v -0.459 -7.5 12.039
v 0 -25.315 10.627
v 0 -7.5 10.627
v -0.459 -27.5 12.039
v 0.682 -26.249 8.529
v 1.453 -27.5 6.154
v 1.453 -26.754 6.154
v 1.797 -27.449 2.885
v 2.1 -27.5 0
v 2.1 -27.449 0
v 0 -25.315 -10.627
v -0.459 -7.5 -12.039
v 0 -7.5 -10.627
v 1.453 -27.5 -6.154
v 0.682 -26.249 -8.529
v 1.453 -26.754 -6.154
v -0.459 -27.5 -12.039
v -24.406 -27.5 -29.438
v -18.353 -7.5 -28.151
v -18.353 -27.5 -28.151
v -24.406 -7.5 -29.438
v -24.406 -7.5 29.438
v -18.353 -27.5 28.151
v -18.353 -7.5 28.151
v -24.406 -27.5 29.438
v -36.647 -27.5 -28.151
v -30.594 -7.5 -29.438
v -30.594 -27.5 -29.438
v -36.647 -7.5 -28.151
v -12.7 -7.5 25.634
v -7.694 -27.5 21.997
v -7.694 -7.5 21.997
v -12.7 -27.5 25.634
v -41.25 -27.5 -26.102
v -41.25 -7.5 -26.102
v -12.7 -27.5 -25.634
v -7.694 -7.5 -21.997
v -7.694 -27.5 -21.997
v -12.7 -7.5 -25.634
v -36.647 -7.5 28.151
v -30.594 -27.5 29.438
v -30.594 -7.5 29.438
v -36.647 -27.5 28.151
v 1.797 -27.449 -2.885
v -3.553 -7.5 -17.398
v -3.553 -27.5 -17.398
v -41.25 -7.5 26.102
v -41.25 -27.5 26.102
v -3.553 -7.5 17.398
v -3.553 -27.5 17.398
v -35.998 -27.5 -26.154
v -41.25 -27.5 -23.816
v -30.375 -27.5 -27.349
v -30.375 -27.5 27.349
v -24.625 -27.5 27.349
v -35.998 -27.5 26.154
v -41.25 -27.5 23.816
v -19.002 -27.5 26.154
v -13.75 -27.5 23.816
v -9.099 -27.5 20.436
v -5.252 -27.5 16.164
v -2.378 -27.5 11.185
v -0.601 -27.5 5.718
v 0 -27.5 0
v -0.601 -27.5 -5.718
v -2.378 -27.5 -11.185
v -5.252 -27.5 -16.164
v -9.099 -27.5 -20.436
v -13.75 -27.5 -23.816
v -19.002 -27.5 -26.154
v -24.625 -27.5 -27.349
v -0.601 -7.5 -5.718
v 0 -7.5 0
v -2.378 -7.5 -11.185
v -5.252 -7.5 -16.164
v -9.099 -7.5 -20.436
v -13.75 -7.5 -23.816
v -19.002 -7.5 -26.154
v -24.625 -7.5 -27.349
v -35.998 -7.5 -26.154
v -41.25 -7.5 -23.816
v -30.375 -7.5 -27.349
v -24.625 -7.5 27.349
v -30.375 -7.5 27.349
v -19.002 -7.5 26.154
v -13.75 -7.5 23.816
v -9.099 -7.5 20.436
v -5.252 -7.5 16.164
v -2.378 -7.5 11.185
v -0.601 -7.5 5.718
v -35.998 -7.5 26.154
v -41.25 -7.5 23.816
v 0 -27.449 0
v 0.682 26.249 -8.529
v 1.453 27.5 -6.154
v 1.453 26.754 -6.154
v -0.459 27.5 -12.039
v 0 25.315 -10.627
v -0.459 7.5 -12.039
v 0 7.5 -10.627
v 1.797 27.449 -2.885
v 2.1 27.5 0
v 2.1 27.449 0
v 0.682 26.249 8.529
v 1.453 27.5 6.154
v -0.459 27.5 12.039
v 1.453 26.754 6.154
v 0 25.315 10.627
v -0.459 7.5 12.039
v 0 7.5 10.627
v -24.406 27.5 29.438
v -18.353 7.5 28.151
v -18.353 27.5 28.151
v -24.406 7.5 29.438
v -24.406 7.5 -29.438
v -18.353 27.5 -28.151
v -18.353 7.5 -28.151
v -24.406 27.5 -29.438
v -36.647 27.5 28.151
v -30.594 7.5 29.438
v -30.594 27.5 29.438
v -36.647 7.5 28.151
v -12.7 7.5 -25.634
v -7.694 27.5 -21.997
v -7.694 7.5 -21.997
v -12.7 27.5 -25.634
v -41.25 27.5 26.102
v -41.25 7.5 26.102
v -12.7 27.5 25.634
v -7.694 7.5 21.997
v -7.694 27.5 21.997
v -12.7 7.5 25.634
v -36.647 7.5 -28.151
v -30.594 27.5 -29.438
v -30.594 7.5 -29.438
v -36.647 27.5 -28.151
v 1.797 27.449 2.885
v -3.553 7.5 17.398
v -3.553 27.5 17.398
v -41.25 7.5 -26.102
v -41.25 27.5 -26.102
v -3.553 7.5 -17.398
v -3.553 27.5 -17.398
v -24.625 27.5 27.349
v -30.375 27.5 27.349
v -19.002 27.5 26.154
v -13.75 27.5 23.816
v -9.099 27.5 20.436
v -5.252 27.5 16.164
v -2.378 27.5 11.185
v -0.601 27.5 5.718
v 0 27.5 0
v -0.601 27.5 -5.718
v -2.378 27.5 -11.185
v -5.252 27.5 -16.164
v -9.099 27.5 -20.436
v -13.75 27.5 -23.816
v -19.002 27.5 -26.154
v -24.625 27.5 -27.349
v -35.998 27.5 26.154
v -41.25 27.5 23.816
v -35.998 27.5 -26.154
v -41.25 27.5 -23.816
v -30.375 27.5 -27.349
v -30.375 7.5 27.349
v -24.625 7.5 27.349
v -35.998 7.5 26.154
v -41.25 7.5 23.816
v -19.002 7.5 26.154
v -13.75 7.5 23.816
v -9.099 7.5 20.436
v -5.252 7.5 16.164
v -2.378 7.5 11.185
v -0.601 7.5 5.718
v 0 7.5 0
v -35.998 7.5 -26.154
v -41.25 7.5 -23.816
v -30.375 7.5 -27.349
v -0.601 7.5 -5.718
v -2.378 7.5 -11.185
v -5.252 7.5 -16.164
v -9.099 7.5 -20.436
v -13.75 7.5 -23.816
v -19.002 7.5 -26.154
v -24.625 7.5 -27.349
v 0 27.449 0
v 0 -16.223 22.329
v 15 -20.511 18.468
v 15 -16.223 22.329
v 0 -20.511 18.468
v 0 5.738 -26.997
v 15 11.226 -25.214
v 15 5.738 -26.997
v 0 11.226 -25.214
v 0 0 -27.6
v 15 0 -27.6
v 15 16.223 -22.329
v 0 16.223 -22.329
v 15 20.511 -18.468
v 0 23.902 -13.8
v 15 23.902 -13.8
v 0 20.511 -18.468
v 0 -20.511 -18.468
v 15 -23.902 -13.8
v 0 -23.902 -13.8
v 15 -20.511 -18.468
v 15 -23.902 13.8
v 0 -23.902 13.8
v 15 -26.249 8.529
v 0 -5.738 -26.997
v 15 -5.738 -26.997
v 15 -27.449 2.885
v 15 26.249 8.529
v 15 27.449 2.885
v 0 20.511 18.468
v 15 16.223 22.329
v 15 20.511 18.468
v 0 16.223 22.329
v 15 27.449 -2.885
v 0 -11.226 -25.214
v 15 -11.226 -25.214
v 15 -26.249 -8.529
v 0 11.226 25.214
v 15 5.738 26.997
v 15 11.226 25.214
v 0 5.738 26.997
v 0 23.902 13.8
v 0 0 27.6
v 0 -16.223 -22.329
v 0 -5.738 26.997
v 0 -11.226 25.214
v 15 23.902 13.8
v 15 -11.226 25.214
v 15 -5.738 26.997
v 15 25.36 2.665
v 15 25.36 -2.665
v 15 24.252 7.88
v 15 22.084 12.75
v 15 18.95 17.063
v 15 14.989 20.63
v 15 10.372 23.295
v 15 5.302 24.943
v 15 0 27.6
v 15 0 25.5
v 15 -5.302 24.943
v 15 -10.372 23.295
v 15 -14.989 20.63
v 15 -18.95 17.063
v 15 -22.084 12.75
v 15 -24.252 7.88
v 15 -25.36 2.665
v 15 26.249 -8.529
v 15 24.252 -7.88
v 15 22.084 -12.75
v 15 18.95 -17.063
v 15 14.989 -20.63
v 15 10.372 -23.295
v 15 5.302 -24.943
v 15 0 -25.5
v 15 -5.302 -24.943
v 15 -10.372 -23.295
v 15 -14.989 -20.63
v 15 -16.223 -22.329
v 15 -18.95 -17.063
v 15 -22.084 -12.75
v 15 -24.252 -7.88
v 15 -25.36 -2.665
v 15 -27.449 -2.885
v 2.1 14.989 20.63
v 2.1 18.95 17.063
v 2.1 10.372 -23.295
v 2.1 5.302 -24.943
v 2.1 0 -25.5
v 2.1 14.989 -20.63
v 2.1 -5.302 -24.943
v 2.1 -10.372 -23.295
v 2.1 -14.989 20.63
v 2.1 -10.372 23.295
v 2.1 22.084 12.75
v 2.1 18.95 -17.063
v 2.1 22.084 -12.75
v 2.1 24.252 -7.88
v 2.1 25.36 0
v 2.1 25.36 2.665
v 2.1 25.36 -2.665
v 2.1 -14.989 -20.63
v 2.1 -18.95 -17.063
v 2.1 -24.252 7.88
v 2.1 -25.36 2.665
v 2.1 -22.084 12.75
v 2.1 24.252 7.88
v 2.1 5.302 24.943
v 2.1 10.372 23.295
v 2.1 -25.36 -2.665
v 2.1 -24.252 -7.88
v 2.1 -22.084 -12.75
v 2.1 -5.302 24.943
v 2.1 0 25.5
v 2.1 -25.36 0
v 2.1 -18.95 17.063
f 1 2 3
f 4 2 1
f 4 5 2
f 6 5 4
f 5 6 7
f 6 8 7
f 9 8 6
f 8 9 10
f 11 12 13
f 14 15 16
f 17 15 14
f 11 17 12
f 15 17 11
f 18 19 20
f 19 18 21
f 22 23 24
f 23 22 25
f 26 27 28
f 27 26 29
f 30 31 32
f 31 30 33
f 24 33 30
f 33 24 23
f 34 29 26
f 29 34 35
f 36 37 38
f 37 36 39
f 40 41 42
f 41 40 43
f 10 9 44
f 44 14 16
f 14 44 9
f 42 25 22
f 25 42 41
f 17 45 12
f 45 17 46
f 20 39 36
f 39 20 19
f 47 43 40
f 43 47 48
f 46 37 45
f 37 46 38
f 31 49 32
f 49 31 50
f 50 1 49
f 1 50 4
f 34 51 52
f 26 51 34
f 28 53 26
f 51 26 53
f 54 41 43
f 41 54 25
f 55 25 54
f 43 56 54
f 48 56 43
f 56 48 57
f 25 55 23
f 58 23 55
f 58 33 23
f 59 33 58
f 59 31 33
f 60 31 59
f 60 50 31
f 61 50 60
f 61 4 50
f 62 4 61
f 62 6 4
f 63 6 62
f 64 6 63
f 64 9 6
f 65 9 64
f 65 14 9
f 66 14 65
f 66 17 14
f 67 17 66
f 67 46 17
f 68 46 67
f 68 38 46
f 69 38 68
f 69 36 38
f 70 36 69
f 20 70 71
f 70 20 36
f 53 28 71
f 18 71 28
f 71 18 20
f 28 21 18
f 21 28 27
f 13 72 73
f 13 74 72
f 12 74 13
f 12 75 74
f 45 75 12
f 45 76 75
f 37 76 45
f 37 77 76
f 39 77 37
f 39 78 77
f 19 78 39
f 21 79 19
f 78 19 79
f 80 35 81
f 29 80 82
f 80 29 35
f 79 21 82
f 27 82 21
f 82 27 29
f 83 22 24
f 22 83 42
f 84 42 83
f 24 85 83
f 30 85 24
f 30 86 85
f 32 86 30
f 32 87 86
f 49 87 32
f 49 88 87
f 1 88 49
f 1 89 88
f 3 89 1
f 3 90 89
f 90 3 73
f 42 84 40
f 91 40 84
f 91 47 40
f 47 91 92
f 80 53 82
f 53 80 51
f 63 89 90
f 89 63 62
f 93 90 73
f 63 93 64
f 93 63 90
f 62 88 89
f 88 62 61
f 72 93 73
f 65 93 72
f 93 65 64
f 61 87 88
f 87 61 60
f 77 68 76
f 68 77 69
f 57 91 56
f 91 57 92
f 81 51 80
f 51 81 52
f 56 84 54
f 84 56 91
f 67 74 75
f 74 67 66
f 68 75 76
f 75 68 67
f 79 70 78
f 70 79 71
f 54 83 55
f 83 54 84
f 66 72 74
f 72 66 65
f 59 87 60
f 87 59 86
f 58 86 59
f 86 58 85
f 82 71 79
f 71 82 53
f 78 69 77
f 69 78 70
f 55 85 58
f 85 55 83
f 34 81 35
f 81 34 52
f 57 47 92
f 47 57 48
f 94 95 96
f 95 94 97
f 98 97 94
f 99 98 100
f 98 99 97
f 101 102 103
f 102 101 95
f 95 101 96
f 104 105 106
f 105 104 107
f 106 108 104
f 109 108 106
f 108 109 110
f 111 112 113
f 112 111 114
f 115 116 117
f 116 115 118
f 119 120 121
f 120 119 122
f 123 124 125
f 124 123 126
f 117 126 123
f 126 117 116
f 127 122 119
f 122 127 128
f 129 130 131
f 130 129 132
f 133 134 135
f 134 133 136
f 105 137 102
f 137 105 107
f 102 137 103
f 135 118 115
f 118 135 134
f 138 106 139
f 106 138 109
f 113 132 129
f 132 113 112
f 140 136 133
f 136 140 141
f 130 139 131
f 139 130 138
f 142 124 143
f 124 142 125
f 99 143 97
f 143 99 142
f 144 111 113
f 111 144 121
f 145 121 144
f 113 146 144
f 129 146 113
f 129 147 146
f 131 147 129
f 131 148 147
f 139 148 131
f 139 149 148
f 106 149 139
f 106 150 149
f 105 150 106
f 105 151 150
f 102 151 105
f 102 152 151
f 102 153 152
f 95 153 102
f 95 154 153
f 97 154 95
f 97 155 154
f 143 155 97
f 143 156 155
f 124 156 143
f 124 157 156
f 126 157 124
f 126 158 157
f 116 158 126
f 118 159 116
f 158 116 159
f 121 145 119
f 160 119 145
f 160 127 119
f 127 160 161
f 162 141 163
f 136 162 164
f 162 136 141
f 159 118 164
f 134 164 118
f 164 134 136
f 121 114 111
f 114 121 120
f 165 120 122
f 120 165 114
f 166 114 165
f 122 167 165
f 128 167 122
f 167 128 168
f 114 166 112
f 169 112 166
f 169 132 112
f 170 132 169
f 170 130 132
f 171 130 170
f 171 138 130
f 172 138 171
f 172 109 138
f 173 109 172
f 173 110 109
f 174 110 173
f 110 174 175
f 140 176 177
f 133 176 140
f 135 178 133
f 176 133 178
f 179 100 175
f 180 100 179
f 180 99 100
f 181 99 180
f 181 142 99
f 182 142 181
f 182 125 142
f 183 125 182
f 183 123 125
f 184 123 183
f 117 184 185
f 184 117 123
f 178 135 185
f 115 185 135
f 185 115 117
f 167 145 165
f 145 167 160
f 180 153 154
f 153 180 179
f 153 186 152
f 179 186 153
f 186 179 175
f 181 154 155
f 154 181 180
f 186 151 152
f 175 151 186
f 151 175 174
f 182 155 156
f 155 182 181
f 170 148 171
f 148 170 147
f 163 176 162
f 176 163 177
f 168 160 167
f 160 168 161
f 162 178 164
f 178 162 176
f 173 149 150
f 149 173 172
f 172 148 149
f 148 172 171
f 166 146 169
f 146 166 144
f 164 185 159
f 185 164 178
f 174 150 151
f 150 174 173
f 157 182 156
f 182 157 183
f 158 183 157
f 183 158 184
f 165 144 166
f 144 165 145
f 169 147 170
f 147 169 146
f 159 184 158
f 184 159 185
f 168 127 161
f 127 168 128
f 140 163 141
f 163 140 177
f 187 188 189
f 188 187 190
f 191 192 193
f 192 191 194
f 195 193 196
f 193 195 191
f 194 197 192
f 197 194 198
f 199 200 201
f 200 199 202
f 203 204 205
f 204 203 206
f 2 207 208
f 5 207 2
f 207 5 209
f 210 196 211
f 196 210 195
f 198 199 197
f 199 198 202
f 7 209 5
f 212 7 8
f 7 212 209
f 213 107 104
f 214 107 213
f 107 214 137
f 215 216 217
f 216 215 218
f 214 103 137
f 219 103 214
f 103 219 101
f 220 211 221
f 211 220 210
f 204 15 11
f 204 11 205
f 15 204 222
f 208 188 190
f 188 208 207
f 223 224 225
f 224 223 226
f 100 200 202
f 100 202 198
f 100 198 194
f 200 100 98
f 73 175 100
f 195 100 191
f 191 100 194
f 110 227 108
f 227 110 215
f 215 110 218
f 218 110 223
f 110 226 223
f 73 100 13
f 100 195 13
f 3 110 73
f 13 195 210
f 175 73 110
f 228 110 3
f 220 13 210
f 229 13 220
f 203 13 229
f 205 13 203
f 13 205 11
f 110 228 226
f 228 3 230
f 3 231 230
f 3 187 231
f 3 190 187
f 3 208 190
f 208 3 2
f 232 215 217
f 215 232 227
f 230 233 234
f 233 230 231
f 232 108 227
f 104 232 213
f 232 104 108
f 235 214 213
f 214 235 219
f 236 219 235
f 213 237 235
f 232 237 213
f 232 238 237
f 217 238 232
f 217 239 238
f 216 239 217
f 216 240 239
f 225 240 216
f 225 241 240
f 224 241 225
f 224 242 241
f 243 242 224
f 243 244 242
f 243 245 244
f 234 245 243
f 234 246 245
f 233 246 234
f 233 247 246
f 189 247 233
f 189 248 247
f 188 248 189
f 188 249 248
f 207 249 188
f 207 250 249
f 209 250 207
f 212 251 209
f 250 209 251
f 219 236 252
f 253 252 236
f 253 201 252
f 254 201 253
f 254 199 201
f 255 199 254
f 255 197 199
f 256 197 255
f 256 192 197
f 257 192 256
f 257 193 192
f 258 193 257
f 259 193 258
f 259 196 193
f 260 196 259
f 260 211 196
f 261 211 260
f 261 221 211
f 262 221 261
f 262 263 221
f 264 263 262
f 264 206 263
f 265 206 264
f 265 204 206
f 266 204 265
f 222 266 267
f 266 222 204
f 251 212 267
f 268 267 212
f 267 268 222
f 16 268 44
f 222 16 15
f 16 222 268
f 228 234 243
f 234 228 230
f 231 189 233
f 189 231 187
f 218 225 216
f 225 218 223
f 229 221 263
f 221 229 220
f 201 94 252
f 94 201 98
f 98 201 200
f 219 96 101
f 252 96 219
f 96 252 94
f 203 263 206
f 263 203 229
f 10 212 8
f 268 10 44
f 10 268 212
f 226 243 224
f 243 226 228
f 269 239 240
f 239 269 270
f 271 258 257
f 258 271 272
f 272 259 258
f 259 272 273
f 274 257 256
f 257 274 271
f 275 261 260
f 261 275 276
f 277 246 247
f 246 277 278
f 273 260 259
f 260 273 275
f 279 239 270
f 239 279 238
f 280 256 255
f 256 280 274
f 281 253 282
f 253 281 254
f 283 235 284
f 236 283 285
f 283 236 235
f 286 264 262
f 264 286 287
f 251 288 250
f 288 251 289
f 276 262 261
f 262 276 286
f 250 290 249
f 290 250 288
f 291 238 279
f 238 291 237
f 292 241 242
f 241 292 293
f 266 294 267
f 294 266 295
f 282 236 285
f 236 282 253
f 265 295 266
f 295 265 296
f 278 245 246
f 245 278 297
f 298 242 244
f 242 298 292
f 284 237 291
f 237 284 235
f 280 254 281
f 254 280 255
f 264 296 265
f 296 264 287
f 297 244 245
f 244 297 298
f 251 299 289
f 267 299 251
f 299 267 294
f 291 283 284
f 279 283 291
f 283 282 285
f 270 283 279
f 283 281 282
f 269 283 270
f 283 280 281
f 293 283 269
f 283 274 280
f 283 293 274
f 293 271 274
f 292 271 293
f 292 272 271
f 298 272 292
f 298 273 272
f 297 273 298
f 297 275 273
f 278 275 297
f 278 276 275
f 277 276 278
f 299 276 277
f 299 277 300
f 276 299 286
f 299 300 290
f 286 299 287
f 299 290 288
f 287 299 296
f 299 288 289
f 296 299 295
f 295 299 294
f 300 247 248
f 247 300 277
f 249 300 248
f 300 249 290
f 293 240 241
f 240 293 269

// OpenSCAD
insideRadius=25.5;
outsideRadius=27.5;
thickness=2.1;
lengthOfArm=15;

// number of sides
shape=30; //[3:Triangle, 4:Square, 5:Pentagon, 6:Hexagon, 8:Octogon, 30:Circle]
$fn=shape;


x1angle=90;


y1angle=90;


z1angle=0;


rotate([x1angle,0,0])
    translate([-outsideRadius,0,7.5])
        arm_clamp();

rotate([x1angle+180,0,0])
    translate([-outsideRadius,0,7.5])
        arm_clamp();
    
arm_outer();




//call heel

//heel();



module arm_outer(){
rotate([0,y1angle,0])
    difference()
    {
        cylinder (lengthOfArm,insideRadius+thickness,       insideRadius+thickness);
        translate([0,0,thickness])
           cylinder (lengthOfArm+1,insideRadius,insideRadius);
    }
}


module arm_clamp()
{
    arm_inner_length=20;
    difference()
    {
        cylinder (arm_inner_length,outsideRadius+thickness,outsideRadius+thickness);
        cylinder (arm_inner_length+1,outsideRadius,outsideRadius);
        #
        translate([-outsideRadius,0,0])
            cube([outsideRadius,2*(insideRadius+thickness),2*(insideRadius+thickness)],center=true);
    }
}

module heel(){

sphere(insideRadius+thickness);
$fn=50;
}
//end modules
